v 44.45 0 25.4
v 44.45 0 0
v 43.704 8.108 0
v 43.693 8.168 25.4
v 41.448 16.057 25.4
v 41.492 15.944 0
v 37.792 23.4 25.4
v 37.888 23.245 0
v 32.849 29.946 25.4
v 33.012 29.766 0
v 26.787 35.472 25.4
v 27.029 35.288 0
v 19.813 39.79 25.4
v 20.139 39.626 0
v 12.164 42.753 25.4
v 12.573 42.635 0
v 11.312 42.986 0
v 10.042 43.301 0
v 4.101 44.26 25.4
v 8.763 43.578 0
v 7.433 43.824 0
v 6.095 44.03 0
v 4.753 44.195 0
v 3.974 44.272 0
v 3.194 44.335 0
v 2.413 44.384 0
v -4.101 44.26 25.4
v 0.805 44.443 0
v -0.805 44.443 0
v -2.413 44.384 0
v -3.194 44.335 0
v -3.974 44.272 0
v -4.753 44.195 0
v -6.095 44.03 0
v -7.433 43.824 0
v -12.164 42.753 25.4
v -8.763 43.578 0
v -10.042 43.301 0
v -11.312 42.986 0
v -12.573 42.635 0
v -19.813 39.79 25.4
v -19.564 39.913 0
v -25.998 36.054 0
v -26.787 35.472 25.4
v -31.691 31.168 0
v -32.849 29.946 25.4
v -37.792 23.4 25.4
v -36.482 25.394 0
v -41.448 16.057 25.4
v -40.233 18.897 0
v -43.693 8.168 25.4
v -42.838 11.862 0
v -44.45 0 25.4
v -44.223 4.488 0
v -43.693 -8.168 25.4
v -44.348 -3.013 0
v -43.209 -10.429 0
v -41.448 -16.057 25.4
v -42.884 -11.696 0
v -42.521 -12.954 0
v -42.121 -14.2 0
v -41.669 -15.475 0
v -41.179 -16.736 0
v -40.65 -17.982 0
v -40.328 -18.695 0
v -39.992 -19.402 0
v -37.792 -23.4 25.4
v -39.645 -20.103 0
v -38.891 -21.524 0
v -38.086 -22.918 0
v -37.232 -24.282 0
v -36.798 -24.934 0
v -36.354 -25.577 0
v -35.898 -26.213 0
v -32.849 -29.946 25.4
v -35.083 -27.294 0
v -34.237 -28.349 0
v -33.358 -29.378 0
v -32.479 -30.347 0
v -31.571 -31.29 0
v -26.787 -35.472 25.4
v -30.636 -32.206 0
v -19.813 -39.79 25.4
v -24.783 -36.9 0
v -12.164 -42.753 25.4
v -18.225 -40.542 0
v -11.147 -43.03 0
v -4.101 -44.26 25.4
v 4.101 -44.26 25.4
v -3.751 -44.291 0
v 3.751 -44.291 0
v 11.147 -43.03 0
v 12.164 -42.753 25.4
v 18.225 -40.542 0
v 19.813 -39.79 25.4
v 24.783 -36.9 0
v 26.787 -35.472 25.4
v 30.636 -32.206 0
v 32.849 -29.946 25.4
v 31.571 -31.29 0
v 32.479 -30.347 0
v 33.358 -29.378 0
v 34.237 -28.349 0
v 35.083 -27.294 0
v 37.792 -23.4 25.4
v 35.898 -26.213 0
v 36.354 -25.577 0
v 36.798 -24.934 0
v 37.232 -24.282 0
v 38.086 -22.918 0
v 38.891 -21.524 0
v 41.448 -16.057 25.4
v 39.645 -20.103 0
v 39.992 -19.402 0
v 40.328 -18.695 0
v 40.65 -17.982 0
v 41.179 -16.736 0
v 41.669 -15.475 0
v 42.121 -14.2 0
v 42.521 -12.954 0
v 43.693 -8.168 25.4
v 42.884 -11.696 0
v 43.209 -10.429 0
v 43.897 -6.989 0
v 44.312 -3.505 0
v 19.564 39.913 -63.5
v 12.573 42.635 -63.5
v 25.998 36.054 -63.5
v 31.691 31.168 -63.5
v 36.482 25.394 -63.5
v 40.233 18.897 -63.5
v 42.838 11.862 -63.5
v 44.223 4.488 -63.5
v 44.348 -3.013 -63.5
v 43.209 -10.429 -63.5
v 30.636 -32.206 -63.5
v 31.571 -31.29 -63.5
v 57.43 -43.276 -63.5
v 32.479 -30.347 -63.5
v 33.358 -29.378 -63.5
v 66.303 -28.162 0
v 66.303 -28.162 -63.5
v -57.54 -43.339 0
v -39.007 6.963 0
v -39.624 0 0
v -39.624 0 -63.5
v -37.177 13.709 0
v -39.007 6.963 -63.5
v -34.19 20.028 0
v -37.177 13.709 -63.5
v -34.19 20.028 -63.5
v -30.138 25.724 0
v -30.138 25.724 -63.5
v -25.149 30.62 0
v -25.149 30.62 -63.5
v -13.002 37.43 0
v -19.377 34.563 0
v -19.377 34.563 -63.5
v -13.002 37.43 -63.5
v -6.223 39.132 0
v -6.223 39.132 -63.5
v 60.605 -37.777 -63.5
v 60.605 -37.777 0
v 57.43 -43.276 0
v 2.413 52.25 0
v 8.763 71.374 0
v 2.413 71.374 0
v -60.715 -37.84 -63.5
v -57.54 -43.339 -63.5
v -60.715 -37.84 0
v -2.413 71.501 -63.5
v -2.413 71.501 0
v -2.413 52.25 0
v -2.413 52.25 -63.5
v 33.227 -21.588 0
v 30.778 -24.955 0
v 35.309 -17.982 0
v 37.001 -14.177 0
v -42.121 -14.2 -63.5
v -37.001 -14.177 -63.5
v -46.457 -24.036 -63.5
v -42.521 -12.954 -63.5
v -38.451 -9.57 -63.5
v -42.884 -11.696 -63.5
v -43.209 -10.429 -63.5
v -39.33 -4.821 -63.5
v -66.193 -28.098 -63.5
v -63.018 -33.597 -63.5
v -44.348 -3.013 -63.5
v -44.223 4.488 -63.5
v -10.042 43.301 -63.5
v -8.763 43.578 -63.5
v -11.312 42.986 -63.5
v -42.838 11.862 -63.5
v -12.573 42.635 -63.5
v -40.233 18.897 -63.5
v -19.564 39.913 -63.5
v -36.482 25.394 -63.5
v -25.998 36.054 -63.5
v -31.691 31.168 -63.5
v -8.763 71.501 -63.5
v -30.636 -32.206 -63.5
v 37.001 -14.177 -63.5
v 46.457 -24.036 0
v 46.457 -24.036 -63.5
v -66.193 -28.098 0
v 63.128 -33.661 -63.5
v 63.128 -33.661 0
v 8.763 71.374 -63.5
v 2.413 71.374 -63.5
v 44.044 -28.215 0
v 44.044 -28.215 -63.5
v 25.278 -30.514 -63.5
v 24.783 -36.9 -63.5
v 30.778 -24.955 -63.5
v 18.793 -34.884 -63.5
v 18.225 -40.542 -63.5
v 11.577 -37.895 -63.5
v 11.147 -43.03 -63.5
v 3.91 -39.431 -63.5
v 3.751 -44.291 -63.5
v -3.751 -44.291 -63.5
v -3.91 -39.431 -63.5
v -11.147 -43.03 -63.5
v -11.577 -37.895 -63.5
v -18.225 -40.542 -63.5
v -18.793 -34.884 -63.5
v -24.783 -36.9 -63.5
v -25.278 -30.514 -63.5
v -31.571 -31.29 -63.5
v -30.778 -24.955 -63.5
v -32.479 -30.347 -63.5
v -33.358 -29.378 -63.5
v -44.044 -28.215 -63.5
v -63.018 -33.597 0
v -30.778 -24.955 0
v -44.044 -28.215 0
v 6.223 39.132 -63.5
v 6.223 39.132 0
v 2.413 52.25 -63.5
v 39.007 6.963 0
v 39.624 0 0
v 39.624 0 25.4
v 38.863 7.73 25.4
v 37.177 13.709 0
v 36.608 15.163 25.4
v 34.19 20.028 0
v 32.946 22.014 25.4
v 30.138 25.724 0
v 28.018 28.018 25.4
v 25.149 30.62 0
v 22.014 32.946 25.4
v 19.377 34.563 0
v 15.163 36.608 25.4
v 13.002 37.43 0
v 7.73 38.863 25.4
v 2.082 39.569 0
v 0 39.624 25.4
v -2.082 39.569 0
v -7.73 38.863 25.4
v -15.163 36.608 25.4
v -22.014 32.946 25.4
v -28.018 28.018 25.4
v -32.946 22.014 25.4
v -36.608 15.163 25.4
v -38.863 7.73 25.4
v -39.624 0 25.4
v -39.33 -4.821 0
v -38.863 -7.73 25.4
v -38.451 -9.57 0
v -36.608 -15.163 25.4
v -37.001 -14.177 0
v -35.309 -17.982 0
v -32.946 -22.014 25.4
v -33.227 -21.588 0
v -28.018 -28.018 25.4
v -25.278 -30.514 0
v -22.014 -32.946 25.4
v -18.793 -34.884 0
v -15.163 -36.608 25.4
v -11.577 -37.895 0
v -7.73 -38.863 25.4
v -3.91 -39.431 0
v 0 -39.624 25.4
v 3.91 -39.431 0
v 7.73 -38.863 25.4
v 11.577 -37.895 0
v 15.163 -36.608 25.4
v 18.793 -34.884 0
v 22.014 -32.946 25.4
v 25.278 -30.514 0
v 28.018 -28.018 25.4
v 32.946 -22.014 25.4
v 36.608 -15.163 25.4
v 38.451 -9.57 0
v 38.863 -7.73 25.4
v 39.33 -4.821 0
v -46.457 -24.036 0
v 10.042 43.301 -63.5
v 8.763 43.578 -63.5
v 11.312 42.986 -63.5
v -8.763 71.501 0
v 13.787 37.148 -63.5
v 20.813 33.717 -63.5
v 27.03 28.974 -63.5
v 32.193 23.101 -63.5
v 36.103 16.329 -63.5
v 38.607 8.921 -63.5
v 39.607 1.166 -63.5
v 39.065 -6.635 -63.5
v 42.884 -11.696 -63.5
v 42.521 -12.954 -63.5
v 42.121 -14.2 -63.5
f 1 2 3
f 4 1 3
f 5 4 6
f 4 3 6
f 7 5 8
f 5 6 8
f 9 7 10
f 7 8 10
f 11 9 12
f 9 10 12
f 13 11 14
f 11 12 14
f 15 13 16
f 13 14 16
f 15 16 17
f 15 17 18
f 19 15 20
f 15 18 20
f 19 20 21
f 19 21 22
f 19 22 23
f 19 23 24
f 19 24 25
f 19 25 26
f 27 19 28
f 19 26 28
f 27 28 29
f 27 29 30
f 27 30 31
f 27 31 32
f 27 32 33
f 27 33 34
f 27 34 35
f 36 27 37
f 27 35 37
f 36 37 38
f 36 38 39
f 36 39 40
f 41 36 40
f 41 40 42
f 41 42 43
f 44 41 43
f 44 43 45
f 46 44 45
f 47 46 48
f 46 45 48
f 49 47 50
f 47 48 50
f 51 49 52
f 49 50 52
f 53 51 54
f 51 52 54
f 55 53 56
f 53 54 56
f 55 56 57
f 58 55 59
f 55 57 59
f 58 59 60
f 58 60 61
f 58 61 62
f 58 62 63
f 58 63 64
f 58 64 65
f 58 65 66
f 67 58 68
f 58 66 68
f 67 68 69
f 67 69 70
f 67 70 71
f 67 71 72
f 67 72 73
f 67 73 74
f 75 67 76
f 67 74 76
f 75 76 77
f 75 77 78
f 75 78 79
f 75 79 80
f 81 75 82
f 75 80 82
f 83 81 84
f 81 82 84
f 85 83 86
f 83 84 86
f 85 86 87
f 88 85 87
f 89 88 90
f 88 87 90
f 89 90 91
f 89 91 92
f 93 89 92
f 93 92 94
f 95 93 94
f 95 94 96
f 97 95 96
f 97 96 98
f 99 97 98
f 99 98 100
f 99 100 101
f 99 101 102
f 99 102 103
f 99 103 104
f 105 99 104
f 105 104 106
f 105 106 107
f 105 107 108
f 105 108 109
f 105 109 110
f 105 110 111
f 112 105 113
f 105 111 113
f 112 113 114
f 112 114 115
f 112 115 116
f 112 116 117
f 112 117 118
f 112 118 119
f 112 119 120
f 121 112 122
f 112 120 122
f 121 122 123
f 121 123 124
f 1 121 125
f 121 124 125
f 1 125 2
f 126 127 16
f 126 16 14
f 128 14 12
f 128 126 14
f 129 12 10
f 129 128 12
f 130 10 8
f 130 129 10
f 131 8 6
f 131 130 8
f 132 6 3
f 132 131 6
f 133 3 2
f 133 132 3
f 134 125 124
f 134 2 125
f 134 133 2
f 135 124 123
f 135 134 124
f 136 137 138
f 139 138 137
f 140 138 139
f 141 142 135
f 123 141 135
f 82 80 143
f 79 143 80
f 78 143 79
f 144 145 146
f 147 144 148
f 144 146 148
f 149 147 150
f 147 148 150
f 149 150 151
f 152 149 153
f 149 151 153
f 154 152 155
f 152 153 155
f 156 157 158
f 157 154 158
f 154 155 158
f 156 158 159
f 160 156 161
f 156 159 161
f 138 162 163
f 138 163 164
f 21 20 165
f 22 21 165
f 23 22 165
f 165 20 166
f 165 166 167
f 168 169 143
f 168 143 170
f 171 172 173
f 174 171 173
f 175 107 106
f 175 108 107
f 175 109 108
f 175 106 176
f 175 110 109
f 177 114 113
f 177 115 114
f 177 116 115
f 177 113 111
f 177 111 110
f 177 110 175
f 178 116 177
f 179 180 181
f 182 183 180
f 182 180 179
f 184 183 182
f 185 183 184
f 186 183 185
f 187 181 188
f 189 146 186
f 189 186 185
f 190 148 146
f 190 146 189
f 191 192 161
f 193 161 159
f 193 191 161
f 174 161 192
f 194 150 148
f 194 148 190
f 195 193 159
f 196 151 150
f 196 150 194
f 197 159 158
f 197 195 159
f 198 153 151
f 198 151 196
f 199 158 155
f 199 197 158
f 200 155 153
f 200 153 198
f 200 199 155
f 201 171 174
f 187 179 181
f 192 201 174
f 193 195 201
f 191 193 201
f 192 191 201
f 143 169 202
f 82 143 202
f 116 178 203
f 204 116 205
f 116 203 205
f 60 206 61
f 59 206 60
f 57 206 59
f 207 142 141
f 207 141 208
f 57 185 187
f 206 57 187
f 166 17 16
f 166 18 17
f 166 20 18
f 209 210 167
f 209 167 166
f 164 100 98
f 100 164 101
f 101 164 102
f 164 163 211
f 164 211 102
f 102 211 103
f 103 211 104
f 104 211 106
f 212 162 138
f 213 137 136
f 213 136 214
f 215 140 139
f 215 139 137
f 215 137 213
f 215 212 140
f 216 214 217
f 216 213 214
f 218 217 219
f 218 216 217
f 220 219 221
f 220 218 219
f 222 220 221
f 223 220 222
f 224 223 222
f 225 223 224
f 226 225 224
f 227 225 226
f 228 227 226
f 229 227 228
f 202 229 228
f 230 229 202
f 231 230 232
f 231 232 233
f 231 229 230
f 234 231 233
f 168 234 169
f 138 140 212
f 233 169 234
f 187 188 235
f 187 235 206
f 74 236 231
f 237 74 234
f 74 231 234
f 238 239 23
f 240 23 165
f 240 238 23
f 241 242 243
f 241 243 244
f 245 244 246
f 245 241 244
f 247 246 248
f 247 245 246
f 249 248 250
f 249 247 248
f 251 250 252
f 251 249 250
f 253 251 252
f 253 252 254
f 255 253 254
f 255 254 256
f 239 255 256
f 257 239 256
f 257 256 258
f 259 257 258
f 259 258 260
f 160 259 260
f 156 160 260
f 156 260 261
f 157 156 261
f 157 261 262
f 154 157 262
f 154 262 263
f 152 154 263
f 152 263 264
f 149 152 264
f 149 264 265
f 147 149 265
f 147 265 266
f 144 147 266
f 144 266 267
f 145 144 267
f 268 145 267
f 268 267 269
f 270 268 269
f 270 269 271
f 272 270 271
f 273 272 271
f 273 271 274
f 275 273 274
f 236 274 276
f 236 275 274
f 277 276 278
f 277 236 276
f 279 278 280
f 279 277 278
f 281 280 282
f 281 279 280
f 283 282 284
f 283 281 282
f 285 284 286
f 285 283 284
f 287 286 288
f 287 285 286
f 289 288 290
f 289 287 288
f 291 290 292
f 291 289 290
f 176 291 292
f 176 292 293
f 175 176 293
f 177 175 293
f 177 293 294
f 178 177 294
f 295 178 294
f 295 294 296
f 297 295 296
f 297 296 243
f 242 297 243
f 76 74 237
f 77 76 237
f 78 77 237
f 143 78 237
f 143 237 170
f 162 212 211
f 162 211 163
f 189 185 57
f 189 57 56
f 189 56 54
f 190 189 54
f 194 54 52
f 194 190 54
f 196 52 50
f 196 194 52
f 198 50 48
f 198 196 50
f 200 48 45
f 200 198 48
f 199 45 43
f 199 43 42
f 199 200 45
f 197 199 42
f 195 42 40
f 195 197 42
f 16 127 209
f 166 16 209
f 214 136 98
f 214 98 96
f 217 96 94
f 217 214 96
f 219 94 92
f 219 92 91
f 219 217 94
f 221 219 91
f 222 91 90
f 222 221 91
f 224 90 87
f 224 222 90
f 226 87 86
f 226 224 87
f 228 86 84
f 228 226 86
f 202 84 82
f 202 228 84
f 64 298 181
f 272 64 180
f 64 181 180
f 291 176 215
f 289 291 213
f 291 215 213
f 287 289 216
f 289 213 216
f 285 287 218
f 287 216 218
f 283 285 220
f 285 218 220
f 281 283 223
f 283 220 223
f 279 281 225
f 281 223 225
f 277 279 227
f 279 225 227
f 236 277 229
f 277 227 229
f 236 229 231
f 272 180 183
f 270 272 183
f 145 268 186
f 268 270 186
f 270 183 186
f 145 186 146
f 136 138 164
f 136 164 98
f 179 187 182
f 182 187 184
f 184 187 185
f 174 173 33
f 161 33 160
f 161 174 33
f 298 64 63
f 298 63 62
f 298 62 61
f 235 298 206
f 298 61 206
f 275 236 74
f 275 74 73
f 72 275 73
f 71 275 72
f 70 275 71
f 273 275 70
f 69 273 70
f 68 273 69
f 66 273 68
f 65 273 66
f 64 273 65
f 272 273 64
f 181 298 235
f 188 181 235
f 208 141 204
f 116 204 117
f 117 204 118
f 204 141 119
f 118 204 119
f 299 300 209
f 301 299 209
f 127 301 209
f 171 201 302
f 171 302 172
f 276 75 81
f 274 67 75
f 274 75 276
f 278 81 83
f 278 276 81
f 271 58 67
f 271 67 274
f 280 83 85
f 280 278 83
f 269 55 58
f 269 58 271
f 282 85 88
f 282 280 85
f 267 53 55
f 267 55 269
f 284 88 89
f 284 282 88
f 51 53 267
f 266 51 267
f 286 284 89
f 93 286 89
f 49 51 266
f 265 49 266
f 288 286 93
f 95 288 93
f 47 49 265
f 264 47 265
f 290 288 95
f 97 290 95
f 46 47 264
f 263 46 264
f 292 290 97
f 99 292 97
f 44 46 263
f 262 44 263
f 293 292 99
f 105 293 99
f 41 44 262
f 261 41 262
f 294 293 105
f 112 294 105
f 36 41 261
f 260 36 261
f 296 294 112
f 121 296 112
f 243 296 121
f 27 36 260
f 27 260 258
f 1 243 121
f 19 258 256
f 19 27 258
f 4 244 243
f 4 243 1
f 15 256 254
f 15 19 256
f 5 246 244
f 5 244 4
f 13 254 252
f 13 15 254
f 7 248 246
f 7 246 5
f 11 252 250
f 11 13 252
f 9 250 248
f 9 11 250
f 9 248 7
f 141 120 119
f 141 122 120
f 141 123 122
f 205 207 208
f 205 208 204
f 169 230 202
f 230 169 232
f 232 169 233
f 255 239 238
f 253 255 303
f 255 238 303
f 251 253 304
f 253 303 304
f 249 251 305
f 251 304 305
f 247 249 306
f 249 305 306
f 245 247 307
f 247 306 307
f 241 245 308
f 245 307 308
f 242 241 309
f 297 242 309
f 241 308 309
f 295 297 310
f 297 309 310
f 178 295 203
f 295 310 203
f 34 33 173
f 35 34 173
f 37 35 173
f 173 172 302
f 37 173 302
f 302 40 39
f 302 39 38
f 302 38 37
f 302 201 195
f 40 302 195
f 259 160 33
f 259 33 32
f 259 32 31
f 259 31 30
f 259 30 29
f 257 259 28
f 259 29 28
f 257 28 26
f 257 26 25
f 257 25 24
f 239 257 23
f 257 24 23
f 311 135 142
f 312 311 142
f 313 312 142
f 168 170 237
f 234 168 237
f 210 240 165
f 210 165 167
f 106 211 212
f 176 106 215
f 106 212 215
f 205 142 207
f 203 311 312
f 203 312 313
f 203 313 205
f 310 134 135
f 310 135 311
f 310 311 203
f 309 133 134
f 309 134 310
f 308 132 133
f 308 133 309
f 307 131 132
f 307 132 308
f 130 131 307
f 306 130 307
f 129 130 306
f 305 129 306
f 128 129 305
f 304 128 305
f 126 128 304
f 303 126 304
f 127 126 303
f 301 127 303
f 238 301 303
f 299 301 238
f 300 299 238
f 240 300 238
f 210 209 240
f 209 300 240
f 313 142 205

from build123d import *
from build123d.topology import SkipClean

# Parameters (mm, degrees)
SKETCH1_R           = 44.45
SKETCH1_R_2         = 39.624
BOSS_EXTRUDE1_DEPTH = 25.4
BOSS_EXTRUDE2_START = 63.5
SKETCH2_R           = 39.624
BOSS_EXTRUDE2_DEPTH = 63.5
CUT_EXTRUDE1_DEPTH  = 63.5
BOSS_EXTRUDE3_DEPTH = 63.5


with BuildPart() as part:
    # Sketch1 → Boss-Extrude1 (new body)
    with BuildSketch(Plane.XY):
        Circle(SKETCH1_R)
        Circle(SKETCH1_R_2, mode=Mode.SUBTRACT)
    extrude(amount=BOSS_EXTRUDE1_DEPTH)

    # Sketch2 → Boss-Extrude2 (add)
    with SkipClean():  # the faces are left unmerged after this step: merging them gives an invalid solid
        with BuildSketch(Plane(origin=(0, 0, 0), x_dir=(-1, 0, 0), z_dir=(0, 0, -1)).offset(BOSS_EXTRUDE2_START)):
            with BuildLine():
                ThreePointArc((37.231566396, -24.28194728), (38.494829198, -22.225), (39.644566396, -20.102508681))
                Line((39.644566396, -20.102508681), (63.01819717, -33.597280701))
                Line((63.01819717, -33.597280701), (66.19319717, -28.098019387))
                Line((66.19319717, -28.098019387), (42.120859404, -14.199848698))
                ThreePointArc((42.120859404, -14.199848698), (38.494829198, 22.225), (8.763, 43.577658622))
                Line((8.763, 43.577658622), (8.763, 71.501))
                Line((8.763, 71.501), (2.413, 71.501))
                Line((2.413, 71.501), (2.413, 44.384455962))
                ThreePointArc((2.413, 44.384455962), (0, 44.45), (-2.413, 44.384455962))
                Line((-2.413, 44.384455962), (-2.413, 71.374))
                Line((-2.413, 71.374), (-8.763, 71.374))
                Line((-8.763, 71.374), (-8.763, 43.577658622))
                ThreePointArc((-8.763, 43.577658622), (-38.494829198, 22.225), (-42.120859404, -14.199848698))
                Line((-42.120859404, -14.199848698), (-66.303182396, -28.161519387))
                Line((-66.303182396, -28.161519387), (-63.128182396, -33.660780701))
                Line((-63.128182396, -33.660780701), (-39.644566396, -20.102508681))
                ThreePointArc((-39.644566396, -20.102508681), (-38.494829198, -22.225), (-37.231566396, -24.28194728))
                Line((-37.231566396, -24.28194728), (-60.60519717, -37.776719299))
                Line((-60.60519717, -37.776719299), (-57.43019717, -43.275980613))
                Line((-57.43019717, -43.275980613), (-33.357859404, -29.377809925))
                ThreePointArc((-33.357859404, -29.377809925), (0, -44.45), (33.357859404, -29.377809925))
                Line((33.357859404, -29.377809925), (57.540182396, -43.339480613))
                Line((57.540182396, -43.339480613), (60.715182396, -37.840219299))
                Line((60.715182396, -37.840219299), (37.231566396, -24.28194728))
            make_face()
            Circle(SKETCH2_R, mode=Mode.SUBTRACT)
        extrude(amount=-BOSS_EXTRUDE2_DEPTH)

    # Sketch3 → Cut-Extrude1 (cut)
    with SkipClean():  # the faces are left unmerged after this step: merging them gives an invalid solid
        with BuildSketch(Plane(origin=(0, 0, -63.5), x_dir=(-1, 0, 0), z_dir=(0, 0, -1))):
            with BuildLine():
                Line((-2.413, 52.250458999), (-2.413, 44.384455962))
                ThreePointArc((-2.413, 44.384455962), (0, 44.45), (2.413, 44.384455962))
                Line((2.413, 44.384455962), (2.413, 52.250458999))
                Line((2.413, 52.250458999), (6.223, 39.132283948))
                ThreePointArc((6.223, 39.132283948), (0, 39.624), (-6.223, 39.132283948))
                Line((-6.223, 39.132283948), (-2.413, 52.250458999))
            make_face()
            with BuildLine():
                Line((46.456724852, -24.0355102), (37.001052007, -14.176865886))
                ThreePointArc((37.001052007, -14.176865886), (34.3153906, -19.812), (30.778052007, -24.955418062))
                Line((30.778052007, -24.955418062), (44.043724852, -28.214948799))
                Line((44.043724852, -28.214948799), (37.231566396, -24.28194728))
                ThreePointArc((37.231566396, -24.28194728), (38.494829198, -22.225), (39.644566396, -20.102508681))
                Line((39.644566396, -20.102508681), (46.456724852, -24.0355102))
            make_face()
            with BuildLine():
                Line((-44.043724852, -28.214948799), (-30.778052007, -24.955418062))
                ThreePointArc((-30.778052007, -24.955418062), (-34.3153906, -19.812), (-37.001052007, -14.176865886))
                Line((-37.001052007, -14.176865886), (-46.456724852, -24.0355102))
                Line((-46.456724852, -24.0355102), (-39.644566396, -20.102508681))
                ThreePointArc((-39.644566396, -20.102508681), (-38.494829198, -22.225), (-37.231566396, -24.28194728))
                Line((-37.231566396, -24.28194728), (-44.043724852, -28.214948799))
            make_face()
        extrude(amount=-CUT_EXTRUDE1_DEPTH, mode=Mode.SUBTRACT)

    # Sketch4 → Boss-Extrude3 (add)
    with SkipClean():  # the faces are left unmerged after this step: merging them gives an invalid solid
        with BuildSketch(Plane(origin=(0, 0, -63.5), x_dir=(-1, 0, 0), z_dir=(0, 0, -1))):
            with BuildLine():
                Line((-66.303182396, -28.161519387), (-43.20927926, -10.428839143))
                ThreePointArc((-43.20927926, -10.428839143), (-42.706712228, -12.326363236), (-42.120859404, -14.199848698))
                Line((-42.120859404, -14.199848698), (-66.303182396, -28.161519387))
            make_face()
            with BuildLine():
                Line((-57.43019717, -43.275980613), (-30.63627926, -32.205913947))
                ThreePointArc((-30.63627926, -32.205913947), (-32.028299813, -30.821916084), (-33.357859404, -29.377809925))
                Line((-33.357859404, -29.377809925), (-57.43019717, -43.275980613))
            make_face()
            with BuildLine():
                Line((8.763, 71.501), (12.573, 42.634753089))
                ThreePointArc((12.573, 42.634753089), (10.678412415, 43.14827932), (8.763, 43.577658622))
                Line((8.763, 43.577658622), (8.763, 71.501))
            make_face()
            with BuildLine():
                Line((-8.763, 71.374), (-8.763, 43.577658622))
                ThreePointArc((-8.763, 43.577658622), (-10.678412415, 43.14827932), (-12.573, 42.634753089))
                Line((-12.573, 42.634753089), (-8.763, 71.374))
            make_face()
            with BuildLine():
                Line((57.540182396, -43.339480613), (30.63627926, -32.205913947))
                ThreePointArc((30.63627926, -32.205913947), (32.028299813, -30.821916084), (33.357859404, -29.377809925))
                Line((33.357859404, -29.377809925), (57.540182396, -43.339480613))
            make_face()
            with BuildLine():
                Line((66.19319717, -28.098019387), (42.120859404, -14.199848698))
                ThreePointArc((42.120859404, -14.199848698), (42.706712228, -12.326363236), (43.20927926, -10.428839143))
                Line((43.20927926, -10.428839143), (66.19319717, -28.098019387))
            make_face()
        extrude(amount=-BOSS_EXTRUDE3_DEPTH)


solid = part.part
